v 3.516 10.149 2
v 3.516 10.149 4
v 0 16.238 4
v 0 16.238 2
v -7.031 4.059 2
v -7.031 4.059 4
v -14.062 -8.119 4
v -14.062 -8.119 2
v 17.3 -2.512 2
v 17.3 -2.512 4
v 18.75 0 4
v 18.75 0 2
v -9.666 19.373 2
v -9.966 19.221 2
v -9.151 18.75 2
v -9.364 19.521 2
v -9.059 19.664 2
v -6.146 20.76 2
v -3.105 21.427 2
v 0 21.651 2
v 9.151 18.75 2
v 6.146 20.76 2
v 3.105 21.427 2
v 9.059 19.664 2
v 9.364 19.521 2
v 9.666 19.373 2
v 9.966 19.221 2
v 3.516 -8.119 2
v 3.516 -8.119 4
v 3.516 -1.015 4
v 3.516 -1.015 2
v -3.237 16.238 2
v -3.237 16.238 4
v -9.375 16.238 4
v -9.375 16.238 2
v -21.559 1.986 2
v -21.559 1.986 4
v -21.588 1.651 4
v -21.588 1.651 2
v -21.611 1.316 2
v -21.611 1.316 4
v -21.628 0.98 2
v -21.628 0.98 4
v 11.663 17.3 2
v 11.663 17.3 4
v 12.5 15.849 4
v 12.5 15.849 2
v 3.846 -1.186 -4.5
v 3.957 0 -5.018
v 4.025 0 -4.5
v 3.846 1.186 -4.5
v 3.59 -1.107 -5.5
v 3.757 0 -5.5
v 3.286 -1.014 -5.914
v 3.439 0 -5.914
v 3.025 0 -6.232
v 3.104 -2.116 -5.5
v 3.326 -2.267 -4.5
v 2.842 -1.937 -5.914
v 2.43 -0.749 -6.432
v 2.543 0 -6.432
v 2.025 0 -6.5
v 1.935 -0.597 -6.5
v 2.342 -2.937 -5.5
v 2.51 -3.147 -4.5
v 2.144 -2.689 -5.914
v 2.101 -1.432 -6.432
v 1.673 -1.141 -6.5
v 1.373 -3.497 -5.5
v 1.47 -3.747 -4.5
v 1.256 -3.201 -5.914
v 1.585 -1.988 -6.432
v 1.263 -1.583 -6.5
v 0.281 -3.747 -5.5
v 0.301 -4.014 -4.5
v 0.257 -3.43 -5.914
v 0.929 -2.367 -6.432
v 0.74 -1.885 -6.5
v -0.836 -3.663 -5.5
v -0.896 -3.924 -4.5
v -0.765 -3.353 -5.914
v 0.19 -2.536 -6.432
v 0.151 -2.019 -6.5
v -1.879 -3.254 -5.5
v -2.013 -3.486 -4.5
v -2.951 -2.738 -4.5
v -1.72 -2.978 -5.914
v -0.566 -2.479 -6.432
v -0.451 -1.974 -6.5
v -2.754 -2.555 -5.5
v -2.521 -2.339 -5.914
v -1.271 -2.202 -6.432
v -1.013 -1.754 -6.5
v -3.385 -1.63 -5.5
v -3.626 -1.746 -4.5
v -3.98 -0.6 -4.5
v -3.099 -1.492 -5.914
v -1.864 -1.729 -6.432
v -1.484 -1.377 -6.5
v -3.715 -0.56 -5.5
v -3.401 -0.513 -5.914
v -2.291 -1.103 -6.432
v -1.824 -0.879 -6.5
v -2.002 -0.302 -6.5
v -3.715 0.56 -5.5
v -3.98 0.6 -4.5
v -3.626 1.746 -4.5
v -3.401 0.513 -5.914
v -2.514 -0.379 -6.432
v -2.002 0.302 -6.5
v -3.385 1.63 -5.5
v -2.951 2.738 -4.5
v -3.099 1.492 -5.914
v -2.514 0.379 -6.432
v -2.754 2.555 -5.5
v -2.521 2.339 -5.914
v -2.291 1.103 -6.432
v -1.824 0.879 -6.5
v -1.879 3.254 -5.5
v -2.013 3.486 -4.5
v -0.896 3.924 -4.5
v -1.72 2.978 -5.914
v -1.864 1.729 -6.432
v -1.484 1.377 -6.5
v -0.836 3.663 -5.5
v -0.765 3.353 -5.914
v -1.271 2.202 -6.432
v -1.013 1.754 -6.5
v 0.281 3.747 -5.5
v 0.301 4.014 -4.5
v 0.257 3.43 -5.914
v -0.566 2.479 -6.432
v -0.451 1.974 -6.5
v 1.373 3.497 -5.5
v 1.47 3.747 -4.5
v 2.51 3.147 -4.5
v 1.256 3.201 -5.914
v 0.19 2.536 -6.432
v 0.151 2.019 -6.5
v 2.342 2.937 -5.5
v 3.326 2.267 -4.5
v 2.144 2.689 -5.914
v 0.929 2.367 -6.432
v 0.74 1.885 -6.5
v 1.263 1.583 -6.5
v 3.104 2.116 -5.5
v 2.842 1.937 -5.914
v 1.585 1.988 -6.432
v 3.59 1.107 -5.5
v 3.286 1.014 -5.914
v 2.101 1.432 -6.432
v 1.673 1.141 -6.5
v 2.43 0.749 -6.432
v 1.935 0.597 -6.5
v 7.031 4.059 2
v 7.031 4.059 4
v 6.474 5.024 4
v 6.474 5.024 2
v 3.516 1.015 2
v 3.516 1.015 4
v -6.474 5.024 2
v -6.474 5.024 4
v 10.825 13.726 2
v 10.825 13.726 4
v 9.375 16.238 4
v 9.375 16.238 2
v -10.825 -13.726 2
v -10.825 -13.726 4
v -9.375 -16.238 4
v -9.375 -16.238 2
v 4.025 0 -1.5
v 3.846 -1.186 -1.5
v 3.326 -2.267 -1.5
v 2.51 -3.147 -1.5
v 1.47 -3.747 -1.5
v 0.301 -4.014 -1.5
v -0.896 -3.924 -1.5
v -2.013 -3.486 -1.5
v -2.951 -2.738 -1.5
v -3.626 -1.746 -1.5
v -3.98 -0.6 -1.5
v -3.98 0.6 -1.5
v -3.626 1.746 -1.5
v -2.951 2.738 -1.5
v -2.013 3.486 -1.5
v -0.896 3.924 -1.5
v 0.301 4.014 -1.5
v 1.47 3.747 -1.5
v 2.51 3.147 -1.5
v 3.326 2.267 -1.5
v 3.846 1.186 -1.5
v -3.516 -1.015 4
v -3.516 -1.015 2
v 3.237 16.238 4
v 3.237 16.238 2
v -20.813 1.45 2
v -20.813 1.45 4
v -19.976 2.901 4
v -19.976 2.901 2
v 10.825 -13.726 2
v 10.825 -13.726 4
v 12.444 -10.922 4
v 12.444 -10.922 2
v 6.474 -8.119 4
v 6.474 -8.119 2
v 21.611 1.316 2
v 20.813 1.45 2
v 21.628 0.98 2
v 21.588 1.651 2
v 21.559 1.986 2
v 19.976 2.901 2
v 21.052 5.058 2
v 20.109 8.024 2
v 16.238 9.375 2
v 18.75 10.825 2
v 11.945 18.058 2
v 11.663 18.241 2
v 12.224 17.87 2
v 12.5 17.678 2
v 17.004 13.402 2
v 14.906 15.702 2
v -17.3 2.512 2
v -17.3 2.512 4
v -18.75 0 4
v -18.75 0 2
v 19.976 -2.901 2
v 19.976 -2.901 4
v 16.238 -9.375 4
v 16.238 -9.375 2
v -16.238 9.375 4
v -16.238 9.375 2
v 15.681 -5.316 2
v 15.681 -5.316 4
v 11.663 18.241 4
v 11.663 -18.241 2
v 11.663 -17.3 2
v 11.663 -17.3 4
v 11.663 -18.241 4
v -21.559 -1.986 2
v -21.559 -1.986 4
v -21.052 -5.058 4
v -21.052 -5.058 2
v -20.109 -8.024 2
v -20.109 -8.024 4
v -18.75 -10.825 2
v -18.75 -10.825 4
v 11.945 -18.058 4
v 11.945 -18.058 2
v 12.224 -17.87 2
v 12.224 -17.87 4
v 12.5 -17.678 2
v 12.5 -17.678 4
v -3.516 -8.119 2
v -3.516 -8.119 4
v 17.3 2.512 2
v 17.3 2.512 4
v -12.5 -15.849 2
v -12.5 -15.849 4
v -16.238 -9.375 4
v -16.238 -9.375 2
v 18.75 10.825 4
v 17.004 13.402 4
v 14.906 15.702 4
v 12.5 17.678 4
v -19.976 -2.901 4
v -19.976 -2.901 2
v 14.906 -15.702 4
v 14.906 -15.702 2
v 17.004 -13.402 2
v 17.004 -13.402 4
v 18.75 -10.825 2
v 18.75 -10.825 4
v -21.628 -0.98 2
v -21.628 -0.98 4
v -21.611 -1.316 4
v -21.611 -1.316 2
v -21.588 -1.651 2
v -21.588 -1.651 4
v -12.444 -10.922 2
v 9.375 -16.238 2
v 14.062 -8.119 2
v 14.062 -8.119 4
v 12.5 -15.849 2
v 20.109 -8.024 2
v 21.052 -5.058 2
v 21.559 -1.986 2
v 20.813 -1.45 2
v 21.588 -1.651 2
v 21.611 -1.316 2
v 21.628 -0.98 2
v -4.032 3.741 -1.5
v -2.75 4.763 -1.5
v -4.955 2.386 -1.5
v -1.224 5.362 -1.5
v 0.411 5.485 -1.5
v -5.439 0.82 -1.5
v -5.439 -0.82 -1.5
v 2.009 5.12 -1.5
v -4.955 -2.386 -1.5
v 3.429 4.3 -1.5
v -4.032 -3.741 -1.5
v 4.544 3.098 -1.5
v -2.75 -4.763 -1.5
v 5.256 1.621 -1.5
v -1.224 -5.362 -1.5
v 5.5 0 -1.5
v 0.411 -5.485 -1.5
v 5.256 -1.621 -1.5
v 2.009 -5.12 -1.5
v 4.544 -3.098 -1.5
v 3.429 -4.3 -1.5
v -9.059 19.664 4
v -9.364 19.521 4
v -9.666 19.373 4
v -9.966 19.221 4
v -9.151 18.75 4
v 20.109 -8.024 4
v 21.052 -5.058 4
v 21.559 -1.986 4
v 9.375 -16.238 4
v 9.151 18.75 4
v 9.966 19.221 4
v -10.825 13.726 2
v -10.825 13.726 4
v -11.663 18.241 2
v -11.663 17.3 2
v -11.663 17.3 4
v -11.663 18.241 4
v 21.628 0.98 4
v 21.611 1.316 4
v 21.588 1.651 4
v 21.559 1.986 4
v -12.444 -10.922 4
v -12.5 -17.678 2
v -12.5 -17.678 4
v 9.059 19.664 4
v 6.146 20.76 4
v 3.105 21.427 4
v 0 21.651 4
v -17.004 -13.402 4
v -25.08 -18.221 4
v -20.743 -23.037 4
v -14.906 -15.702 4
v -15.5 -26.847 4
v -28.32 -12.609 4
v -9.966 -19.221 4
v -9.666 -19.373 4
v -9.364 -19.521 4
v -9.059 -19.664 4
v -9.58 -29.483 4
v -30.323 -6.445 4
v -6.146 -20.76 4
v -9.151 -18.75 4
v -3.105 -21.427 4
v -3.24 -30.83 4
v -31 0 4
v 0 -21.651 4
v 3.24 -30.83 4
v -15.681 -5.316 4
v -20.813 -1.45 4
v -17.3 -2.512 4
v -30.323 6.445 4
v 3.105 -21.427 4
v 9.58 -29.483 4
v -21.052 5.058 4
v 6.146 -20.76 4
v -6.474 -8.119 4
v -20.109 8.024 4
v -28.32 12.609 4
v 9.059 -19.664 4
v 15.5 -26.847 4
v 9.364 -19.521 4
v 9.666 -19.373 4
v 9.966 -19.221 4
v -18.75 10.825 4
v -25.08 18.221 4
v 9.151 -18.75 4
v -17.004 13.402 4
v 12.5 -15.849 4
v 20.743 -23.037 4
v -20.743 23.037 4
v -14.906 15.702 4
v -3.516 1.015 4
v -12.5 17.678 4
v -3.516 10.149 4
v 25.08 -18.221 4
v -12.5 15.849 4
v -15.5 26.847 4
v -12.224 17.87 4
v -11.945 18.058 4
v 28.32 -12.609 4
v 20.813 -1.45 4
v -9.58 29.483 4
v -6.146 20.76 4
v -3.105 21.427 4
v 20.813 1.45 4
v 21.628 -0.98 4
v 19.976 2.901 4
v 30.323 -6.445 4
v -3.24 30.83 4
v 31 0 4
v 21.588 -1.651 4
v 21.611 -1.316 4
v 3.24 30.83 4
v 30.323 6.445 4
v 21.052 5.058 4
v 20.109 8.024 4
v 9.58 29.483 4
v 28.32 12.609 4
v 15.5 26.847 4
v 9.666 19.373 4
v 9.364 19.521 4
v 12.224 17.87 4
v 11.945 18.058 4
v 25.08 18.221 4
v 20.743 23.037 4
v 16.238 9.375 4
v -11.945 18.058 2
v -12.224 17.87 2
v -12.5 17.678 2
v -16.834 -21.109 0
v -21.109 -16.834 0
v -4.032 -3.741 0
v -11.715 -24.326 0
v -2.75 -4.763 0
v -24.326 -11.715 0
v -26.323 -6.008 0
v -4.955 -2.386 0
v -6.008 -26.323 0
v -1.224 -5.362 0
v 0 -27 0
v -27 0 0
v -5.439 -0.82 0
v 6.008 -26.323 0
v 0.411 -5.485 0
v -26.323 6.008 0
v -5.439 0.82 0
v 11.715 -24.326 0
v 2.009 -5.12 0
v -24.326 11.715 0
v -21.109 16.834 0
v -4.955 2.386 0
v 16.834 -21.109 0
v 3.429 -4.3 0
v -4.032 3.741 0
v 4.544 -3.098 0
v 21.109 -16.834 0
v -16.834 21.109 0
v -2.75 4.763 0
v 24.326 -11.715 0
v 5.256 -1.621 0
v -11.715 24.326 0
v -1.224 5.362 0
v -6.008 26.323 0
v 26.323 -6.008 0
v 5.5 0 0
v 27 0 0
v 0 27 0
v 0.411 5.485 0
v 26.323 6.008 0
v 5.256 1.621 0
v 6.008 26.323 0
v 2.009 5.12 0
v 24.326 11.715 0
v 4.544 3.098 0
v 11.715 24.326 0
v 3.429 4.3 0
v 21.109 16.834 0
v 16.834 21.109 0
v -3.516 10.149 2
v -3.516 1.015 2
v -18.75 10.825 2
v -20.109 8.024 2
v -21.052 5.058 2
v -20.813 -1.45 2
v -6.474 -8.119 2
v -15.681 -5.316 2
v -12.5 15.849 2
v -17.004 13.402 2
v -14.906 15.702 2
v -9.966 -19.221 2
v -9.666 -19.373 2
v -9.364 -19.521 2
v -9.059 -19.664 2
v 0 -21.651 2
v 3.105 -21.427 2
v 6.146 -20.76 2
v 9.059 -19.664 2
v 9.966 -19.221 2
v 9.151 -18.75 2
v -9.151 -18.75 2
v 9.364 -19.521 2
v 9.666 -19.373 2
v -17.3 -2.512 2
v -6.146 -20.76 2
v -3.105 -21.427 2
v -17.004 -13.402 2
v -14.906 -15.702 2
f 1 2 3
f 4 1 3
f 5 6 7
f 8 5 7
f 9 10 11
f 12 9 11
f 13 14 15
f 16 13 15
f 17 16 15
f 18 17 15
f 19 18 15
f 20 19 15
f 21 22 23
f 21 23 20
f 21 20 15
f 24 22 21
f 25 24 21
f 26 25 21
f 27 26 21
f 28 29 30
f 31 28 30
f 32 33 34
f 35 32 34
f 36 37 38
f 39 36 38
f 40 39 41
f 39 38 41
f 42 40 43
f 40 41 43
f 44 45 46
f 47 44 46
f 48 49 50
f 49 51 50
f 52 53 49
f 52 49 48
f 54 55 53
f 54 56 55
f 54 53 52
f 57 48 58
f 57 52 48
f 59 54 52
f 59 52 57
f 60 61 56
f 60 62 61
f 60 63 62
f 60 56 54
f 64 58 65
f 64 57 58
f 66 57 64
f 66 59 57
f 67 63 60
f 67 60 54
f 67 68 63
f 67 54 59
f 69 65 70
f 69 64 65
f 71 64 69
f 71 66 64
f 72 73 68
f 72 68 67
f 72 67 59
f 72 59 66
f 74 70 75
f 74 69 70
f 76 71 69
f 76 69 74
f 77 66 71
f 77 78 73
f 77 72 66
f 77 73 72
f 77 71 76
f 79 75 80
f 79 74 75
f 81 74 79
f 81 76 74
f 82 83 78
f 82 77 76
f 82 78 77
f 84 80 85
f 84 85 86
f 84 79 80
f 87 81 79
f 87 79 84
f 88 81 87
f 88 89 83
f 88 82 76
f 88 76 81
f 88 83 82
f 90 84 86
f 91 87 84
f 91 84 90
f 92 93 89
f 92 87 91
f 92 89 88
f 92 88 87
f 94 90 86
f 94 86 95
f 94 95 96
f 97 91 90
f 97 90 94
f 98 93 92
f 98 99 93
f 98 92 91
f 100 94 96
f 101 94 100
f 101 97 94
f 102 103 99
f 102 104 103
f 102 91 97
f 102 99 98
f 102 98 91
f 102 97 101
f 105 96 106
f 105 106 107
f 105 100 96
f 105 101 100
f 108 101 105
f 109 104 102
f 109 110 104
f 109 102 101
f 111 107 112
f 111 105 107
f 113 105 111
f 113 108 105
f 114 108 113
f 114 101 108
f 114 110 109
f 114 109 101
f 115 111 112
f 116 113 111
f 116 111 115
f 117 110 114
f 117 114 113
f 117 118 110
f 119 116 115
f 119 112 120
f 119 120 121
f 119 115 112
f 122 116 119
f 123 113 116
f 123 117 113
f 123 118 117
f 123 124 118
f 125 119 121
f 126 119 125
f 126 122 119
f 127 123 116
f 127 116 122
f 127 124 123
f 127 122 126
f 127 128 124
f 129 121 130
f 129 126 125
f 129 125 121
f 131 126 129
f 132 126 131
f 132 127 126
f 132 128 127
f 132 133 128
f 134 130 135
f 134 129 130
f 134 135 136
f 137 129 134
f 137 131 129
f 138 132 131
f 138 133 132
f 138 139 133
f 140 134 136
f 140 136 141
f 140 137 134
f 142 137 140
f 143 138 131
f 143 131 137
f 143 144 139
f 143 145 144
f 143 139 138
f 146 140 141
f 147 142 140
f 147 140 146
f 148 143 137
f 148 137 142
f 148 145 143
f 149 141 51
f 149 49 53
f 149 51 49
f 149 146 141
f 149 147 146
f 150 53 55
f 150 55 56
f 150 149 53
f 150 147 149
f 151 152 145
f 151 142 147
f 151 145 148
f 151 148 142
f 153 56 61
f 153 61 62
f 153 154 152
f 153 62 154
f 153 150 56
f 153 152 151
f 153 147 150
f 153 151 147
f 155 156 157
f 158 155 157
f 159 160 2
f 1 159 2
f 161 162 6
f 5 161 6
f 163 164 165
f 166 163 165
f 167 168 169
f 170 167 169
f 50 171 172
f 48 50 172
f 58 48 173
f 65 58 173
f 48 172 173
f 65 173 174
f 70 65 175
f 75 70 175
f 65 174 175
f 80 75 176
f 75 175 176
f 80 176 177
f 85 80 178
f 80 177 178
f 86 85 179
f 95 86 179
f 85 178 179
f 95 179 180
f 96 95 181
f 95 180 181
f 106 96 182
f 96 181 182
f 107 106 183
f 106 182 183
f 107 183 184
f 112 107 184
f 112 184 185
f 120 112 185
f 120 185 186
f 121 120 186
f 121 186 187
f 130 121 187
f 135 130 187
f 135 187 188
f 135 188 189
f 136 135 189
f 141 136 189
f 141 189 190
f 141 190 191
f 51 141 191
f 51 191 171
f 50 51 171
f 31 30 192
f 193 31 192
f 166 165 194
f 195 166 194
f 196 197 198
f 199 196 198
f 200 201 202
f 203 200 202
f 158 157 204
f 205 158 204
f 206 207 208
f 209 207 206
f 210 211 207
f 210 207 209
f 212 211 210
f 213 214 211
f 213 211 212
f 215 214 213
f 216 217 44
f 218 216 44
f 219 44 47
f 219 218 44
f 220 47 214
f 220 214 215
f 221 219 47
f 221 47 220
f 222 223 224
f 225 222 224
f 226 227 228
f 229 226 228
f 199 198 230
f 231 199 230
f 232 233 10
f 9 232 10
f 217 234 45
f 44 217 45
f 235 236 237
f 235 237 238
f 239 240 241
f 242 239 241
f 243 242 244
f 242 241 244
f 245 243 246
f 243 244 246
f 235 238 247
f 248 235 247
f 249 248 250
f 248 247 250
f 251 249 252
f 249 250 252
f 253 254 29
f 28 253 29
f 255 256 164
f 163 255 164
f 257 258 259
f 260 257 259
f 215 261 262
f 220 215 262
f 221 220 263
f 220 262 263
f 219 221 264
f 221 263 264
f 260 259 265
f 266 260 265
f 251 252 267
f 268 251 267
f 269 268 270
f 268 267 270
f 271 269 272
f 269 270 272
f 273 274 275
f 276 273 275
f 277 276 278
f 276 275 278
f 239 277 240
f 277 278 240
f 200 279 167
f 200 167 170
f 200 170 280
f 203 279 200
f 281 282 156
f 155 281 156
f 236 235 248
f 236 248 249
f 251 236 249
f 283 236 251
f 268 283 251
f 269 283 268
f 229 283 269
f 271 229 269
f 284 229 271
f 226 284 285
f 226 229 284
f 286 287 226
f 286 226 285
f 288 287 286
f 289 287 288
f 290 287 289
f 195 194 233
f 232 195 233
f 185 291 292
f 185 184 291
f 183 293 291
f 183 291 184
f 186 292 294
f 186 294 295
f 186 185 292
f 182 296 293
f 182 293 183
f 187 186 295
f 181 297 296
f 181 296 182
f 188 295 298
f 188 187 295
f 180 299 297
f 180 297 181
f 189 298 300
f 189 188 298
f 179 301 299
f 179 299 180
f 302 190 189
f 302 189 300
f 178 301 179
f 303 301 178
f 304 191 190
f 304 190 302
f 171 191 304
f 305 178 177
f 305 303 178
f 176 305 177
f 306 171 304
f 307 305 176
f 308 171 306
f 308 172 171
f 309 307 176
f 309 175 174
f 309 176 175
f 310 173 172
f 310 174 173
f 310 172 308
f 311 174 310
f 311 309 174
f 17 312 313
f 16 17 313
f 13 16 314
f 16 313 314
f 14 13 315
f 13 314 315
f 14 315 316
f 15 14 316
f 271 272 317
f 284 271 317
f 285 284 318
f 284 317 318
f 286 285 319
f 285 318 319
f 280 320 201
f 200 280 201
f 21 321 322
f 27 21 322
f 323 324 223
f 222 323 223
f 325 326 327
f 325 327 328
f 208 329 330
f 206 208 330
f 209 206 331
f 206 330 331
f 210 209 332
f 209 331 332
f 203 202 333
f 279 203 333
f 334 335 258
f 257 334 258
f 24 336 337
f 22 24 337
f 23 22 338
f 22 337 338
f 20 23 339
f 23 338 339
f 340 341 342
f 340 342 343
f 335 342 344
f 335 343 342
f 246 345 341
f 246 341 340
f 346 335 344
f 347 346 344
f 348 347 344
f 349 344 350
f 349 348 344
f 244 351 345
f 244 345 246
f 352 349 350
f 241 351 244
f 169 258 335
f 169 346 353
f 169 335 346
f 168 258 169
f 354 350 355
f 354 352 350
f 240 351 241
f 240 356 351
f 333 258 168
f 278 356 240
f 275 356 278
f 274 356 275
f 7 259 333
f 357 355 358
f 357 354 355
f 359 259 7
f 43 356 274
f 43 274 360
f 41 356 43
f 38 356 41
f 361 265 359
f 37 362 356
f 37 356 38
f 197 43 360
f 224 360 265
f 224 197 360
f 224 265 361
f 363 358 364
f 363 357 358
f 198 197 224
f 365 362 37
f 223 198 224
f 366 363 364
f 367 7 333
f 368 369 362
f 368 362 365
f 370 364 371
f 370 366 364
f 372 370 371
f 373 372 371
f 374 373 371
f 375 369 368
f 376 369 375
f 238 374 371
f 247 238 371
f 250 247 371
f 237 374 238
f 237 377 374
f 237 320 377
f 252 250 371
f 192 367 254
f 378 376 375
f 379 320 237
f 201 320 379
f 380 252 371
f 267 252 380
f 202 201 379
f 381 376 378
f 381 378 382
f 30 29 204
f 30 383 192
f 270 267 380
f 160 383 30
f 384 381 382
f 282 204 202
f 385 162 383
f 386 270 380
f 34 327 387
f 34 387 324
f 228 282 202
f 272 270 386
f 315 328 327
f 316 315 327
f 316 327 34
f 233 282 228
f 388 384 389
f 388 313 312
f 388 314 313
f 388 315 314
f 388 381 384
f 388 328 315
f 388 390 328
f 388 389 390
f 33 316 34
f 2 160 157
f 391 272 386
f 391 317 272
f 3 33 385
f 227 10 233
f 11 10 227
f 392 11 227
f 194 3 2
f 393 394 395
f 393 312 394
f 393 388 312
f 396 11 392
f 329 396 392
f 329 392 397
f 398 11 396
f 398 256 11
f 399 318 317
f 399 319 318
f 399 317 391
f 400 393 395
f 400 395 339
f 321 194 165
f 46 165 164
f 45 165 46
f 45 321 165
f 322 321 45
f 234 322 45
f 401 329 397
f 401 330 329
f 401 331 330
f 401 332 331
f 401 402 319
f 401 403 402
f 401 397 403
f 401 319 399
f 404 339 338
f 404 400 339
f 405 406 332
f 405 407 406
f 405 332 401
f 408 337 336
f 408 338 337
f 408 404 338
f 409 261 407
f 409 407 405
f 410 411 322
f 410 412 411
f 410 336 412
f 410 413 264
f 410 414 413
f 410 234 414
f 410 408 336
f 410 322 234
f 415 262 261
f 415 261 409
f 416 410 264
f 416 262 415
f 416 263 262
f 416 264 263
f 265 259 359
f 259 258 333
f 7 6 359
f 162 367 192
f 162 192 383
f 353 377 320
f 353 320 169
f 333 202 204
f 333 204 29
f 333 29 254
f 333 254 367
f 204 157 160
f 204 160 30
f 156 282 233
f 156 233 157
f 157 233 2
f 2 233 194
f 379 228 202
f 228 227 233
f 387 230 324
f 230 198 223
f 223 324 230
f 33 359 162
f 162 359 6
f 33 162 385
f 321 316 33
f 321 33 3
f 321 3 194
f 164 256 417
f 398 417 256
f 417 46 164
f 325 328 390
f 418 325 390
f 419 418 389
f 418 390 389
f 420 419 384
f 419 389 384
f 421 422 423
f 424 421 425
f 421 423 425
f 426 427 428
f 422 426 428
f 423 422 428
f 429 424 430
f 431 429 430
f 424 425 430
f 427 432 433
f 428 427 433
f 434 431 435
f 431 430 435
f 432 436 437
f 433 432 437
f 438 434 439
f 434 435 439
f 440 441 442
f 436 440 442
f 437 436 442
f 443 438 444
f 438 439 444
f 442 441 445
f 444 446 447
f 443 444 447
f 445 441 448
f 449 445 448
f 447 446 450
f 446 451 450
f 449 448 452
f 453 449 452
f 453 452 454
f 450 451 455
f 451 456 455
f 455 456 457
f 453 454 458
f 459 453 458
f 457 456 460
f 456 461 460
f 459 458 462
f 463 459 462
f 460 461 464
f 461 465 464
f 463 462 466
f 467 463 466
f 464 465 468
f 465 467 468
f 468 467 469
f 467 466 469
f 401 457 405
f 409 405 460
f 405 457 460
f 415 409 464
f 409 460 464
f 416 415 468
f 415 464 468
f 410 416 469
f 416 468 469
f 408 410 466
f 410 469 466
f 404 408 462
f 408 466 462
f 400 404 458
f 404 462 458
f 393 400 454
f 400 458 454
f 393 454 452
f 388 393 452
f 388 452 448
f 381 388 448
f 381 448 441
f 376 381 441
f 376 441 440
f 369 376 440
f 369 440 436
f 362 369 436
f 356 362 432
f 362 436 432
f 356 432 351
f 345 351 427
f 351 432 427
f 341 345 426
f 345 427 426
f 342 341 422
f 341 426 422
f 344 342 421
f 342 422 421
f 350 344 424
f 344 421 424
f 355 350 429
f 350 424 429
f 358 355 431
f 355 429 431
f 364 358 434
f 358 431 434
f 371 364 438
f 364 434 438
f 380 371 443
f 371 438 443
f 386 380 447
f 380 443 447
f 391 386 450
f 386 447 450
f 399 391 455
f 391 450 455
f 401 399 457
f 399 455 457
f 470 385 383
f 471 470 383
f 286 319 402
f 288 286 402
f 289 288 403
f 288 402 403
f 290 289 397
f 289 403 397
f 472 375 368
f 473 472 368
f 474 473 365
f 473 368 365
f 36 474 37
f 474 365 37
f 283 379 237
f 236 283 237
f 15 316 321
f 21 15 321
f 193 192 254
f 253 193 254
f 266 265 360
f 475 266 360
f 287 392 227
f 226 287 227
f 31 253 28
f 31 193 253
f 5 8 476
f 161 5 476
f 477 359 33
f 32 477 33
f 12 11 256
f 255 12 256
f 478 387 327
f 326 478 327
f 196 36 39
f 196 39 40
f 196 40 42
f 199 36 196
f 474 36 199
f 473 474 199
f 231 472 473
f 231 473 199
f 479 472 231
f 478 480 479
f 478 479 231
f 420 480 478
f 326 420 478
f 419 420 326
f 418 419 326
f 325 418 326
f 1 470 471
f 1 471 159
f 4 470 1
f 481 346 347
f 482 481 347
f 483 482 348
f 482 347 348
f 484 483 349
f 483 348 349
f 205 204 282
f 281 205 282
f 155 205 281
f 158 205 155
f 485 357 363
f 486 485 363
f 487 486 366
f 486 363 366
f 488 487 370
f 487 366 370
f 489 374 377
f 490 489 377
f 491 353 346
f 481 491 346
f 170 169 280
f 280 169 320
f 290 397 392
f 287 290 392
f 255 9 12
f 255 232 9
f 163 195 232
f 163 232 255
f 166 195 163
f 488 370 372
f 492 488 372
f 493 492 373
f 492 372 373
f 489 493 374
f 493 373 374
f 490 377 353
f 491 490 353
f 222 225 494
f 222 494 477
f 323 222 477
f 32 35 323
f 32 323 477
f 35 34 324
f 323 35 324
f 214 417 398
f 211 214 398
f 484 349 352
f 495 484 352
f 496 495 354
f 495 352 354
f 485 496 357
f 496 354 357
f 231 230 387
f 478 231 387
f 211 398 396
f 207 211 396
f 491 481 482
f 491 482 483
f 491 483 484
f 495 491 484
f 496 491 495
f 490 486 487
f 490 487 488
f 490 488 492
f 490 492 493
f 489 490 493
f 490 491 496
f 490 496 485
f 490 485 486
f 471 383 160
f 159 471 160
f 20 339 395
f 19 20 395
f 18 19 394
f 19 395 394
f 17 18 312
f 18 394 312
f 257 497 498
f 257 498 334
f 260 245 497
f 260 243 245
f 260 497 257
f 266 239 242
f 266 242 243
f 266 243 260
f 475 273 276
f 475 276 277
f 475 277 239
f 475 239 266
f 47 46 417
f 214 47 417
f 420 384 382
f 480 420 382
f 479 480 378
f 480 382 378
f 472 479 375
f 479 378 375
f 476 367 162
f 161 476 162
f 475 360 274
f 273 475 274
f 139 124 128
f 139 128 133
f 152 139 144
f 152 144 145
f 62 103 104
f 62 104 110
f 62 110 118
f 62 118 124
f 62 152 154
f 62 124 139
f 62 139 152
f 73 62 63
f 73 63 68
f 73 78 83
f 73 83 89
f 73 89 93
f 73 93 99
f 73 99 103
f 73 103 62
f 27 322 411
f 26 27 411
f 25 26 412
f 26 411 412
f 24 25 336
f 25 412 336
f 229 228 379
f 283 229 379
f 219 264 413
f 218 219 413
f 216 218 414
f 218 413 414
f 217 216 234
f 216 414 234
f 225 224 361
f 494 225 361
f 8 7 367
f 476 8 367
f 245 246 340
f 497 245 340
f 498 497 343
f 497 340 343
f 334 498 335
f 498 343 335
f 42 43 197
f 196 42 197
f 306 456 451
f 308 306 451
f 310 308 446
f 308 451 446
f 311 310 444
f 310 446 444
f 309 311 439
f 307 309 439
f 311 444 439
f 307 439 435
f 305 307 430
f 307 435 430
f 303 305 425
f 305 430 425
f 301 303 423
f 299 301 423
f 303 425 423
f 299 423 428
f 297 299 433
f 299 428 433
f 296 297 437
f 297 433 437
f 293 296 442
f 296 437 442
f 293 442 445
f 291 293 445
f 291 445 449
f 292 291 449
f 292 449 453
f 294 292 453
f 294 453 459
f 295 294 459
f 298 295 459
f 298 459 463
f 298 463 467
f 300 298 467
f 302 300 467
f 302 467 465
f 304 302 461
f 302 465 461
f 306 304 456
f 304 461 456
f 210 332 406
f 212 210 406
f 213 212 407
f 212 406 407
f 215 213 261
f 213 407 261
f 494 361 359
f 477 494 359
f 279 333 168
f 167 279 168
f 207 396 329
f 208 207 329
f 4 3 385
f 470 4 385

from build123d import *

# Parameters (mm, degrees)
F0_R     = 32
F1_DEPTH = 4
F3_R     = 5.5
F3_R_2   = 4.025
F4_DEPTH = 1.5
F5_DEPTH = 6.5
F7_DEPTH = 2
F8_R     = 2


# Not quite as in the source:
# - a fillet or chamfer that OpenCascade refuses, or shapes differently, is made with other operations: its cross-section is extruded or revolved along the edge and cut away or added


with BuildPart() as f1:
    # F0 (on Top) → F1 (new body)
    with BuildSketch(Plane.XY):
        Circle(F0_R)
    extrude(amount=F1_DEPTH)

    # F2: chamfer of 5 on 1 edges, made by hand

    # F2_s1 → F2_t2 (revolve, cut)
    with BuildSketch(Plane.XZ):
        Polygon((32, 5), (27, 0), (32, 0), align=None)
    revolve(axis=Axis((0, 0, 0), (0, 0, 1)), mode=Mode.SUBTRACT)

    # F3 (on face) → F4 (join)
    with BuildSketch(Plane(origin=(0, 0, 0), x_dir=(1, 0, 0), z_dir=(0, 0, -1))):
        Circle(F3_R)
        Circle(F3_R_2, mode=Mode.SUBTRACT)
    extrude(amount=F4_DEPTH)

    # F3 (on face) → F5 (join)
    with BuildSketch(Plane(origin=(0, 0, 0), x_dir=(1, 0, 0), z_dir=(0, 0, -1))):
        Circle(F3_R_2)
    extrude(amount=F5_DEPTH)

    # F6 (on face) → F7 (cut)
    with BuildSketch(Plane.XY.offset(4)):
        with BuildLine():
            Line((16.237976321, -9.375), (18.75, -10.8253175473))
            ThreePointArc((18.75, -10.8253175473), (20.6335015486, -6.5580952909), (21.5593108924, -1.9864827825))
            Line((21.5593108924, -1.9864827825), (19.9759526419, -2.9006350946))
            Line((19.9759526419, -2.9006350946), (16.237976321, -9.375))
        make_face()
        with BuildLine():
            ThreePointArc((12.5, -17.6776695297), (15.9962278967, -14.5900888646), (18.75, -10.8253175473))
            Line((18.75, -10.8253175473), (16.237976321, -9.375))
            Line((16.237976321, -9.375), (12.5, -15.8493649054))
            Line((12.5, -15.8493649054), (12.5, -17.6776695297))
        make_face()
        with BuildLine():
            ThreePointArc((21.5593108924, 1.9864827825), (20.6335020609, 6.5580936791), (18.7500016913, 10.8253146179))
            ThreePointArc((18.7500016913, 10.8253146179), (15.9962290364, 14.590087615), (12.5, 17.6776695297))
            Line((12.5, 17.6776695297), (12.5, 15.8493649054))
            Line((12.5, 15.8493649054), (16.2379763781, 9.3749999011))
            Line((16.2379763781, 9.3749999011), (19.9759526419, 2.9006350946))
            Line((19.9759526419, 2.9006350946), (21.5593108924, 1.9864827825))
        make_face()
        with BuildLine():
            ThreePointArc((9.0593108924, 19.6641523121), (4.6372736512, 21.1481841557), (-1.3e-09, 21.6506350946))
            ThreePointArc((-1.3e-09, 21.6506350946), (-4.6372736525, 21.1481841554), (-9.0593108924, 19.6641523121))
            Line((-9.0593108924, 19.6641523121), (-7.4759526419, 18.75))
            Line((-7.4759526419, 18.75), (-3.65e-08, 18.75))
            Line((-3.65e-08, 18.75), (7.4759526419, 18.75))
            Line((7.4759526419, 18.75), (9.0593108924, 19.6641523121))
        make_face()
        with BuildLine():
            ThreePointArc((-9.0593108924, -19.6641523121), (-4.6372736547, -21.1481841549), (-5.7e-09, -21.6506350946))
            ThreePointArc((-5.7e-09, -21.6506350946), (4.6372736491, -21.1481841562), (9.0593108924, -19.6641523121))
            Line((9.0593108924, -19.6641523121), (7.4759526419, -18.75))
            Line((7.4759526419, -18.75), (0, -18.75))
            Line((0, -18.75), (-7.4759526419, -18.75))
            Line((-7.4759526419, -18.75), (-9.0593108924, -19.6641523121))
        make_face()
        with BuildLine():
            ThreePointArc((11.6626587737, -18.2409536573), (12.0846117855, -17.9641909919), (12.5, -17.6776695297))
            Line((12.5, -17.6776695297), (12.5, -15.8493649054))
            Line((12.5, -15.8493649054), (11.6626587737, -17.2996824527))
            Line((11.6626587737, -17.2996824527), (11.6626587737, -18.2409536573))
        make_face()
        with BuildLine():
            Line((19.9759526419, -2.9006350946), (21.5593108924, -1.9864827825))
            ThreePointArc((21.5593108924, -1.9864827825), (21.5997516502, -1.4834853051), (21.6284586433, -0.979681945))
            Line((21.6284586433, -0.979681945), (20.8132938683, -1.4503175473))
            Line((20.8132938683, -1.4503175473), (19.9759526419, -2.9006350946))
        make_face()
        with BuildLine():
            ThreePointArc((21.6284586433, 0.979681945), (21.5997516502, 1.4834853051), (21.5593108924, 1.9864827825))
            Line((21.5593108924, 1.9864827825), (19.9759526419, 2.9006350946))
            Line((19.9759526419, 2.9006350946), (20.8132938683, 1.4503175473))
            Line((20.8132938683, 1.4503175473), (21.6284586433, 0.979681945))
        make_face()
        with BuildLine():
            Line((12.5, 15.8493649054), (12.5, 17.6776695297))
            ThreePointArc((12.5, 17.6776695297), (12.0846117855, 17.9641909919), (11.6626587737, 18.2409536573))
            Line((11.6626587737, 18.2409536573), (11.6626587737, 17.2996824527))
            Line((11.6626587737, 17.2996824527), (12.5, 15.8493649054))
        make_face()
        with BuildLine():
            ThreePointArc((-12.5, 17.6776695297), (-15.9962290427, 14.5900876082), (-18.7500017006, 10.8253146018))
            ThreePointArc((-18.7500017006, 10.8253146018), (-20.6335020637, 6.5580936703), (-21.5593108924, 1.9864827825))
            Line((-21.5593108924, 1.9864827825), (-19.9759526419, 2.9006350946))
            Line((-19.9759526419, 2.9006350946), (-16.2379762959, 9.3750000433))
            Line((-16.2379762959, 9.3750000433), (-12.5, 15.8493649054))
            Line((-12.5, 15.8493649054), (-12.5, 17.6776695297))
        make_face()
        with BuildLine():
            ThreePointArc((9.9657998697, 19.2206356023), (9.5151398647, 19.447676297), (9.0593108924, 19.6641523121))
            Line((9.0593108924, 19.6641523121), (7.4759526419, 18.75))
            Line((7.4759526419, 18.75), (9.1506350946, 18.75))
            Line((9.1506350946, 18.75), (9.9657998697, 19.2206356023))
        make_face()
        with BuildLine():
            Line((-7.4759526419, 18.75), (-9.0593108924, 19.6641523121))
            ThreePointArc((-9.0593108924, 19.6641523121), (-9.5151398647, 19.447676297), (-9.9657998697, 19.2206356023))
            Line((-9.9657998697, 19.2206356023), (-9.1506350946, 18.75))
            Line((-9.1506350946, 18.75), (-7.4759526419, 18.75))
        make_face()
        with BuildLine():
            Line((-16.237976321, -9.375), (-18.75, -10.8253175473))
            ThreePointArc((-18.75, -10.8253175473), (-15.9962278967, -14.5900888646), (-12.5, -17.6776695297))
            Line((-12.5, -17.6776695297), (-12.5, -15.8493649054))
            Line((-12.5, -15.8493649054), (-16.237976321, -9.375))
        make_face()
        with BuildLine():
            ThreePointArc((-21.5593108924, -1.9864827825), (-20.6335015486, -6.5580952909), (-18.75, -10.8253175473))
            Line((-18.75, -10.8253175473), (-16.237976321, -9.375))
            Line((-16.237976321, -9.375), (-19.9759526419, -2.9006350946))
            Line((-19.9759526419, -2.9006350946), (-21.5593108924, -1.9864827825))
        make_face()
        with BuildLine():
            ThreePointArc((-9.9657998697, -19.2206356023), (-9.5151398647, -19.447676297), (-9.0593108924, -19.6641523121))
            Line((-9.0593108924, -19.6641523121), (-7.4759526419, -18.75))
            Line((-7.4759526419, -18.75), (-9.1506350946, -18.75))
            Line((-9.1506350946, -18.75), (-9.9657998697, -19.2206356023))
        make_face()
        with BuildLine():
            Line((7.4759526419, -18.75), (9.0593108924, -19.6641523121))
            ThreePointArc((9.0593108924, -19.6641523121), (9.5151398647, -19.447676297), (9.9657998697, -19.2206356023))
            Line((9.9657998697, -19.2206356023), (9.1506350946, -18.75))
            Line((9.1506350946, -18.75), (7.4759526419, -18.75))
        make_face()
        Polygon((6.4743649054, -16.237976321), (9.375, -16.237976321), (10.8253175473, -13.7259526419), align=None)
        Polygon((17.2996824527, -2.512023679), (18.75, 0), (17.2996824527, 2.512023679), align=None)
        with BuildLine():
            ThreePointArc((-11.6626587737, 18.2409536573), (-12.0846117855, 17.9641909919), (-12.5, 17.6776695297))
            Line((-12.5, 17.6776695297), (-12.5, 15.8493649054))
            Line((-12.5, 15.8493649054), (-11.6626587737, 17.2996824527))
            Line((-11.6626587737, 17.2996824527), (-11.6626587737, 18.2409536573))
        make_face()
        with BuildLine():
            Line((-19.9759526419, 2.9006350946), (-21.5593108924, 1.9864827825))
            ThreePointArc((-21.5593108924, 1.9864827825), (-21.5997516502, 1.4834853051), (-21.6284586433, 0.979681945))
            Line((-21.6284586433, 0.979681945), (-20.8132938683, 1.4503175473))
            Line((-20.8132938683, 1.4503175473), (-19.9759526419, 2.9006350946))
        make_face()
        with BuildLine():
            ThreePointArc((-21.6284586433, -0.979681945), (-21.5997516502, -1.4834853051), (-21.5593108924, -1.9864827825))
            Line((-21.5593108924, -1.9864827825), (-19.9759526419, -2.9006350946))
            Line((-19.9759526419, -2.9006350946), (-20.8132938683, -1.4503175473))
            Line((-20.8132938683, -1.4503175473), (-21.6284586433, -0.979681945))
        make_face()
        Polygon((0, -16.237976321), (6.4743649054, -16.237976321), (10.8253175473, -13.7259526419), (12.4439087737, -10.9224704012), (-12.4439087737, -10.9224704012), (-10.8253175473, -13.7259526419), (-6.4743649054, -16.237976321), align=None)
        Polygon((15.6810912263, -5.3155059198), (17.2996824527, -2.512023679), (17.2996824527, 2.512023679), (10.8253175473, 13.7259526419), (6.4743649054, 16.237976321), (3.2371824527, 16.237976321), align=None)
        Polygon((-17.2996824527, 2.512023679), (-18.75, 0), (-17.2996824527, -2.512023679), align=None)
        Polygon((-10.8253175473, -13.7259526419), (-9.375, -16.237976321), (-6.4743649054, -16.237976321), align=None)
        Polygon((-7.03125, 4.0594940802), (-14.0625, -8.1189881605), (-6.4743649054, -8.1189881605), (-6.4743649054, 5.0240473581), align=None)
        Polygon((10.8253175473, 13.7259526419), (9.375, 16.237976321), (6.4743649054, 16.237976321), align=None)
        Polygon((-6.4743649054, 16.237976321), (-9.375, 16.237976321), (-10.8253175473, 13.7259526419), align=None)
        Polygon((-10.8253175473, 13.7259526419), (-17.2996824527, 2.512023679), (-17.2996824527, -2.512023679), (-15.6810912263, -5.3155059198), (-3.2371824527, 16.237976321), (-6.4743649054, 16.237976321), align=None)
        Polygon((6.4743649054, -8.1189881605), (14.0625, -8.1189881605), (7.03125, 4.0594940802), (6.4743649054, 5.0240473581), align=None)
        Polygon((-3.515625, -4.0594940802), (-3.515625, -8.1189881605), (3.515625, -8.1189881605), (3.515625, -1.0148735201), (0, -1.0148735201), (-3.515625, -1.0148735201), (-3.515625, -2.0297470401), align=None)
        Polygon((3.515625, 10.1487352006), (0, 16.237976321), (-3.515625, 10.1487352006), (-3.515625, 1.0148735201), (0, 1.0148735201), (3.515625, 1.0148735201), align=None)
    extrude(amount=-F7_DEPTH, mode=Mode.SUBTRACT)

    # F8
    f8_edges = [f1.edges().sort_by_distance(p)[0] for p in [
        (-4.025, 0, -6.5),
    ]]
    fillet(f8_edges, radius=F8_R)


solid = f1.part
